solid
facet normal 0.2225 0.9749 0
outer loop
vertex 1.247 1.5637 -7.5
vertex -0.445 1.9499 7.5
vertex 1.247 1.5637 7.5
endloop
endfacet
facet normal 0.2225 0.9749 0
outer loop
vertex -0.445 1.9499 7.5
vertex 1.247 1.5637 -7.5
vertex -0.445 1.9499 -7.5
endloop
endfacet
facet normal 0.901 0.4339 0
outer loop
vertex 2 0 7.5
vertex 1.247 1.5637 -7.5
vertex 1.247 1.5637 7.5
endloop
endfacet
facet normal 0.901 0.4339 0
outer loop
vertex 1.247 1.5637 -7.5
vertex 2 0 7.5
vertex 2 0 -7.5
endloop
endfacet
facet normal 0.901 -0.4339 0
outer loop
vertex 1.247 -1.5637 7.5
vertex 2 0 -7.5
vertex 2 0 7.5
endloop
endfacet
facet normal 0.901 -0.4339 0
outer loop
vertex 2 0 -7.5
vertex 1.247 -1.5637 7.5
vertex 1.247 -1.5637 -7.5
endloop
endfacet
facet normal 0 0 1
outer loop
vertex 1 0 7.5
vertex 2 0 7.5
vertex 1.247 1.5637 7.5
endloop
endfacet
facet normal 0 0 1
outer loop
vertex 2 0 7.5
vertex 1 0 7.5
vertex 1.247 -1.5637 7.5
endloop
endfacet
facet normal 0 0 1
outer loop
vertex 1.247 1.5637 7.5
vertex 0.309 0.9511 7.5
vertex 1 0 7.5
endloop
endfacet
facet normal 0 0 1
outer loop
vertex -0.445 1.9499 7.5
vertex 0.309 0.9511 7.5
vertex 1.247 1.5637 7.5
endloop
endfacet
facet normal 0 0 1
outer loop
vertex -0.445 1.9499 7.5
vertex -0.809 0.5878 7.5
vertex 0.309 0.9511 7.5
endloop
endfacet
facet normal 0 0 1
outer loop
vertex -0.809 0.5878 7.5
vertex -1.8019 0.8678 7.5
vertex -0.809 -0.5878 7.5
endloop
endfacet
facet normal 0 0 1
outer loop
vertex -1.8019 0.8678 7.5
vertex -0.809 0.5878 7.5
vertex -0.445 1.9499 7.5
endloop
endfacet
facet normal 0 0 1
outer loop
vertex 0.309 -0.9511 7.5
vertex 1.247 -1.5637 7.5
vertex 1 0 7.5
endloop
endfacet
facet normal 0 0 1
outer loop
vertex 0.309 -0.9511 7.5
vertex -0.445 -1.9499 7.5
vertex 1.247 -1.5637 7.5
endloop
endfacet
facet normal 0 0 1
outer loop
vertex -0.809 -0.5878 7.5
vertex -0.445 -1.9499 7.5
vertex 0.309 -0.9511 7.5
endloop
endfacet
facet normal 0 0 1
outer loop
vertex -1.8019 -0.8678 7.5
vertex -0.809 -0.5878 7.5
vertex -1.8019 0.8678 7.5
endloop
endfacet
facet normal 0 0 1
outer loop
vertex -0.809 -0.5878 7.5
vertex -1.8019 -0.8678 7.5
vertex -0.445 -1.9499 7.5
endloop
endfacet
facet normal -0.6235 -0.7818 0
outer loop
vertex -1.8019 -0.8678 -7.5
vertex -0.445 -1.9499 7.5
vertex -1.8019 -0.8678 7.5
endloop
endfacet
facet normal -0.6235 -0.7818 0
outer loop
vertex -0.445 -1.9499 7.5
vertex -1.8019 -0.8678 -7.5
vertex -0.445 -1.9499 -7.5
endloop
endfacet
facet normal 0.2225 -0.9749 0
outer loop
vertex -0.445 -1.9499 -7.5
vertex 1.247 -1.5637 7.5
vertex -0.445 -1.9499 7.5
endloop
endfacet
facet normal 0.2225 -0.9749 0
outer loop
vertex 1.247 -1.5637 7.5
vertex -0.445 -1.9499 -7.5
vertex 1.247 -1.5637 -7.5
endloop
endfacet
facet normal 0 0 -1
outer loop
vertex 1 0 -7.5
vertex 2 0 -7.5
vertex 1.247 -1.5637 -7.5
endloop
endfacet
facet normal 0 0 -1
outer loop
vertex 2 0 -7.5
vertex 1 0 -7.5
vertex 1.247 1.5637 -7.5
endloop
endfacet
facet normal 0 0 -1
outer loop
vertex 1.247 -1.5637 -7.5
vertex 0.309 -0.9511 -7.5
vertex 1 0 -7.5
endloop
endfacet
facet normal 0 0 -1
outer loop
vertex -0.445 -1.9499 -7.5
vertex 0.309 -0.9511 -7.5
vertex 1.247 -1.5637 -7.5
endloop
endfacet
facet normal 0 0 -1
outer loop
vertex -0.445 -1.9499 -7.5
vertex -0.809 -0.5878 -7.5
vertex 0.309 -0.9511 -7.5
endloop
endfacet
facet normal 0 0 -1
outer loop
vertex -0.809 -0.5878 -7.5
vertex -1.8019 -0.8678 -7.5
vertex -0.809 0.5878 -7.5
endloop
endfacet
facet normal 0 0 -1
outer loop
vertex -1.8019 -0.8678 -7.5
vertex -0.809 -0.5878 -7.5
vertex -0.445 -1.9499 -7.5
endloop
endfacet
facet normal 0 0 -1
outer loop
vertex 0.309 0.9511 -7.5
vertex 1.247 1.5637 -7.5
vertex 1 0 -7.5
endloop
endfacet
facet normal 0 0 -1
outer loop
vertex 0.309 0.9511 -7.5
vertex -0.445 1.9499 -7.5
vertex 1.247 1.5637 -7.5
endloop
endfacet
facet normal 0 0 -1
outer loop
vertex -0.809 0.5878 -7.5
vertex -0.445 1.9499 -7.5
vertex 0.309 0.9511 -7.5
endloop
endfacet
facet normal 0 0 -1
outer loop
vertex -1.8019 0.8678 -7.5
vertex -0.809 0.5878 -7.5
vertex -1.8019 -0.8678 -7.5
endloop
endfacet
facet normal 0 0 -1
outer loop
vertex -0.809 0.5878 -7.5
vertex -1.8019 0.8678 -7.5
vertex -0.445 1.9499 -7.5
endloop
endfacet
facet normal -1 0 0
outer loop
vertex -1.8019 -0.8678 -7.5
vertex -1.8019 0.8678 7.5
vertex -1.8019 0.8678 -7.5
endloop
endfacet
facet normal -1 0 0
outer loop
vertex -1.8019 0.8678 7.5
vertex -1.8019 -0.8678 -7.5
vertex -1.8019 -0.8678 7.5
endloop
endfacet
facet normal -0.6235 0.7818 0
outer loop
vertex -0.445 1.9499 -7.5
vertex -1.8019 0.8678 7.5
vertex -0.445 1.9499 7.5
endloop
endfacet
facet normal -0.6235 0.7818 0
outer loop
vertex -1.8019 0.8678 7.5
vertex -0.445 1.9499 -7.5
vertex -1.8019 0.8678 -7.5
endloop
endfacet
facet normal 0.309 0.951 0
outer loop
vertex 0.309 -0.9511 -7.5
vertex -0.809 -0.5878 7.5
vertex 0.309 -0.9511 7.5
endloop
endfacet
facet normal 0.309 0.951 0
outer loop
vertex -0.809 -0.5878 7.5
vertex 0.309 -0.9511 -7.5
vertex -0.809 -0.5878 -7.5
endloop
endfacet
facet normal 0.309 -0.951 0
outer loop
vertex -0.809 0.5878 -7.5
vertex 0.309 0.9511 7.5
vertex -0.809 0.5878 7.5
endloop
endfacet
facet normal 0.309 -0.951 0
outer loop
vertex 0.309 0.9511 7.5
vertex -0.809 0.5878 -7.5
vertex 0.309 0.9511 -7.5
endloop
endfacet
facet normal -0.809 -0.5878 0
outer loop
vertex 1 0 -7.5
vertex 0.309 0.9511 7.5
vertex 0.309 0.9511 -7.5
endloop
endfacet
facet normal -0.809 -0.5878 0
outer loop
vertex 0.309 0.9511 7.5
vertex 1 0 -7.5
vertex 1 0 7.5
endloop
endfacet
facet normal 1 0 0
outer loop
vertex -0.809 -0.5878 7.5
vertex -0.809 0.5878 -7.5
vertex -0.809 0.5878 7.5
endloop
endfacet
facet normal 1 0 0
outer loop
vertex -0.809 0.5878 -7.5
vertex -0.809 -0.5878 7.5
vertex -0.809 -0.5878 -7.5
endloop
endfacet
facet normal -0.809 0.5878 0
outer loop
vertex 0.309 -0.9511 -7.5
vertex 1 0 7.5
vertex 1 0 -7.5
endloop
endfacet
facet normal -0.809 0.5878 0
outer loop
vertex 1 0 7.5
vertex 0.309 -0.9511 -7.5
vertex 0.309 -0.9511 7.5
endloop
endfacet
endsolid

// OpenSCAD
// Parameters
length = 15; //[8:60:1]
outer_diameter = 4; //[2:12:0.1]
inner_diameter = 2; //[1:10:0.1]
center = 1; //[0:1:1]
forced_id = 0; //[0:10:0.1]

// Tubing - complete geometry
module tubing() {
  color([0.85, 0.85, 0.8]) { // Off-white for PTFE
    difference() {
      // Outer cylinder
      cylinder(h=length, r=outer_diameter/2, center=true);
      // Inner bore
      cylinder(h=length, r=((forced_id > 0) ? forced_id : inner_diameter) / 2, center=true);
    }
  }
}

// Assembly
module assembly() {
  translate([0, 0, ((center >= 0.5) ? 0 : (length / 2))]) tubing();
}

assembly();
